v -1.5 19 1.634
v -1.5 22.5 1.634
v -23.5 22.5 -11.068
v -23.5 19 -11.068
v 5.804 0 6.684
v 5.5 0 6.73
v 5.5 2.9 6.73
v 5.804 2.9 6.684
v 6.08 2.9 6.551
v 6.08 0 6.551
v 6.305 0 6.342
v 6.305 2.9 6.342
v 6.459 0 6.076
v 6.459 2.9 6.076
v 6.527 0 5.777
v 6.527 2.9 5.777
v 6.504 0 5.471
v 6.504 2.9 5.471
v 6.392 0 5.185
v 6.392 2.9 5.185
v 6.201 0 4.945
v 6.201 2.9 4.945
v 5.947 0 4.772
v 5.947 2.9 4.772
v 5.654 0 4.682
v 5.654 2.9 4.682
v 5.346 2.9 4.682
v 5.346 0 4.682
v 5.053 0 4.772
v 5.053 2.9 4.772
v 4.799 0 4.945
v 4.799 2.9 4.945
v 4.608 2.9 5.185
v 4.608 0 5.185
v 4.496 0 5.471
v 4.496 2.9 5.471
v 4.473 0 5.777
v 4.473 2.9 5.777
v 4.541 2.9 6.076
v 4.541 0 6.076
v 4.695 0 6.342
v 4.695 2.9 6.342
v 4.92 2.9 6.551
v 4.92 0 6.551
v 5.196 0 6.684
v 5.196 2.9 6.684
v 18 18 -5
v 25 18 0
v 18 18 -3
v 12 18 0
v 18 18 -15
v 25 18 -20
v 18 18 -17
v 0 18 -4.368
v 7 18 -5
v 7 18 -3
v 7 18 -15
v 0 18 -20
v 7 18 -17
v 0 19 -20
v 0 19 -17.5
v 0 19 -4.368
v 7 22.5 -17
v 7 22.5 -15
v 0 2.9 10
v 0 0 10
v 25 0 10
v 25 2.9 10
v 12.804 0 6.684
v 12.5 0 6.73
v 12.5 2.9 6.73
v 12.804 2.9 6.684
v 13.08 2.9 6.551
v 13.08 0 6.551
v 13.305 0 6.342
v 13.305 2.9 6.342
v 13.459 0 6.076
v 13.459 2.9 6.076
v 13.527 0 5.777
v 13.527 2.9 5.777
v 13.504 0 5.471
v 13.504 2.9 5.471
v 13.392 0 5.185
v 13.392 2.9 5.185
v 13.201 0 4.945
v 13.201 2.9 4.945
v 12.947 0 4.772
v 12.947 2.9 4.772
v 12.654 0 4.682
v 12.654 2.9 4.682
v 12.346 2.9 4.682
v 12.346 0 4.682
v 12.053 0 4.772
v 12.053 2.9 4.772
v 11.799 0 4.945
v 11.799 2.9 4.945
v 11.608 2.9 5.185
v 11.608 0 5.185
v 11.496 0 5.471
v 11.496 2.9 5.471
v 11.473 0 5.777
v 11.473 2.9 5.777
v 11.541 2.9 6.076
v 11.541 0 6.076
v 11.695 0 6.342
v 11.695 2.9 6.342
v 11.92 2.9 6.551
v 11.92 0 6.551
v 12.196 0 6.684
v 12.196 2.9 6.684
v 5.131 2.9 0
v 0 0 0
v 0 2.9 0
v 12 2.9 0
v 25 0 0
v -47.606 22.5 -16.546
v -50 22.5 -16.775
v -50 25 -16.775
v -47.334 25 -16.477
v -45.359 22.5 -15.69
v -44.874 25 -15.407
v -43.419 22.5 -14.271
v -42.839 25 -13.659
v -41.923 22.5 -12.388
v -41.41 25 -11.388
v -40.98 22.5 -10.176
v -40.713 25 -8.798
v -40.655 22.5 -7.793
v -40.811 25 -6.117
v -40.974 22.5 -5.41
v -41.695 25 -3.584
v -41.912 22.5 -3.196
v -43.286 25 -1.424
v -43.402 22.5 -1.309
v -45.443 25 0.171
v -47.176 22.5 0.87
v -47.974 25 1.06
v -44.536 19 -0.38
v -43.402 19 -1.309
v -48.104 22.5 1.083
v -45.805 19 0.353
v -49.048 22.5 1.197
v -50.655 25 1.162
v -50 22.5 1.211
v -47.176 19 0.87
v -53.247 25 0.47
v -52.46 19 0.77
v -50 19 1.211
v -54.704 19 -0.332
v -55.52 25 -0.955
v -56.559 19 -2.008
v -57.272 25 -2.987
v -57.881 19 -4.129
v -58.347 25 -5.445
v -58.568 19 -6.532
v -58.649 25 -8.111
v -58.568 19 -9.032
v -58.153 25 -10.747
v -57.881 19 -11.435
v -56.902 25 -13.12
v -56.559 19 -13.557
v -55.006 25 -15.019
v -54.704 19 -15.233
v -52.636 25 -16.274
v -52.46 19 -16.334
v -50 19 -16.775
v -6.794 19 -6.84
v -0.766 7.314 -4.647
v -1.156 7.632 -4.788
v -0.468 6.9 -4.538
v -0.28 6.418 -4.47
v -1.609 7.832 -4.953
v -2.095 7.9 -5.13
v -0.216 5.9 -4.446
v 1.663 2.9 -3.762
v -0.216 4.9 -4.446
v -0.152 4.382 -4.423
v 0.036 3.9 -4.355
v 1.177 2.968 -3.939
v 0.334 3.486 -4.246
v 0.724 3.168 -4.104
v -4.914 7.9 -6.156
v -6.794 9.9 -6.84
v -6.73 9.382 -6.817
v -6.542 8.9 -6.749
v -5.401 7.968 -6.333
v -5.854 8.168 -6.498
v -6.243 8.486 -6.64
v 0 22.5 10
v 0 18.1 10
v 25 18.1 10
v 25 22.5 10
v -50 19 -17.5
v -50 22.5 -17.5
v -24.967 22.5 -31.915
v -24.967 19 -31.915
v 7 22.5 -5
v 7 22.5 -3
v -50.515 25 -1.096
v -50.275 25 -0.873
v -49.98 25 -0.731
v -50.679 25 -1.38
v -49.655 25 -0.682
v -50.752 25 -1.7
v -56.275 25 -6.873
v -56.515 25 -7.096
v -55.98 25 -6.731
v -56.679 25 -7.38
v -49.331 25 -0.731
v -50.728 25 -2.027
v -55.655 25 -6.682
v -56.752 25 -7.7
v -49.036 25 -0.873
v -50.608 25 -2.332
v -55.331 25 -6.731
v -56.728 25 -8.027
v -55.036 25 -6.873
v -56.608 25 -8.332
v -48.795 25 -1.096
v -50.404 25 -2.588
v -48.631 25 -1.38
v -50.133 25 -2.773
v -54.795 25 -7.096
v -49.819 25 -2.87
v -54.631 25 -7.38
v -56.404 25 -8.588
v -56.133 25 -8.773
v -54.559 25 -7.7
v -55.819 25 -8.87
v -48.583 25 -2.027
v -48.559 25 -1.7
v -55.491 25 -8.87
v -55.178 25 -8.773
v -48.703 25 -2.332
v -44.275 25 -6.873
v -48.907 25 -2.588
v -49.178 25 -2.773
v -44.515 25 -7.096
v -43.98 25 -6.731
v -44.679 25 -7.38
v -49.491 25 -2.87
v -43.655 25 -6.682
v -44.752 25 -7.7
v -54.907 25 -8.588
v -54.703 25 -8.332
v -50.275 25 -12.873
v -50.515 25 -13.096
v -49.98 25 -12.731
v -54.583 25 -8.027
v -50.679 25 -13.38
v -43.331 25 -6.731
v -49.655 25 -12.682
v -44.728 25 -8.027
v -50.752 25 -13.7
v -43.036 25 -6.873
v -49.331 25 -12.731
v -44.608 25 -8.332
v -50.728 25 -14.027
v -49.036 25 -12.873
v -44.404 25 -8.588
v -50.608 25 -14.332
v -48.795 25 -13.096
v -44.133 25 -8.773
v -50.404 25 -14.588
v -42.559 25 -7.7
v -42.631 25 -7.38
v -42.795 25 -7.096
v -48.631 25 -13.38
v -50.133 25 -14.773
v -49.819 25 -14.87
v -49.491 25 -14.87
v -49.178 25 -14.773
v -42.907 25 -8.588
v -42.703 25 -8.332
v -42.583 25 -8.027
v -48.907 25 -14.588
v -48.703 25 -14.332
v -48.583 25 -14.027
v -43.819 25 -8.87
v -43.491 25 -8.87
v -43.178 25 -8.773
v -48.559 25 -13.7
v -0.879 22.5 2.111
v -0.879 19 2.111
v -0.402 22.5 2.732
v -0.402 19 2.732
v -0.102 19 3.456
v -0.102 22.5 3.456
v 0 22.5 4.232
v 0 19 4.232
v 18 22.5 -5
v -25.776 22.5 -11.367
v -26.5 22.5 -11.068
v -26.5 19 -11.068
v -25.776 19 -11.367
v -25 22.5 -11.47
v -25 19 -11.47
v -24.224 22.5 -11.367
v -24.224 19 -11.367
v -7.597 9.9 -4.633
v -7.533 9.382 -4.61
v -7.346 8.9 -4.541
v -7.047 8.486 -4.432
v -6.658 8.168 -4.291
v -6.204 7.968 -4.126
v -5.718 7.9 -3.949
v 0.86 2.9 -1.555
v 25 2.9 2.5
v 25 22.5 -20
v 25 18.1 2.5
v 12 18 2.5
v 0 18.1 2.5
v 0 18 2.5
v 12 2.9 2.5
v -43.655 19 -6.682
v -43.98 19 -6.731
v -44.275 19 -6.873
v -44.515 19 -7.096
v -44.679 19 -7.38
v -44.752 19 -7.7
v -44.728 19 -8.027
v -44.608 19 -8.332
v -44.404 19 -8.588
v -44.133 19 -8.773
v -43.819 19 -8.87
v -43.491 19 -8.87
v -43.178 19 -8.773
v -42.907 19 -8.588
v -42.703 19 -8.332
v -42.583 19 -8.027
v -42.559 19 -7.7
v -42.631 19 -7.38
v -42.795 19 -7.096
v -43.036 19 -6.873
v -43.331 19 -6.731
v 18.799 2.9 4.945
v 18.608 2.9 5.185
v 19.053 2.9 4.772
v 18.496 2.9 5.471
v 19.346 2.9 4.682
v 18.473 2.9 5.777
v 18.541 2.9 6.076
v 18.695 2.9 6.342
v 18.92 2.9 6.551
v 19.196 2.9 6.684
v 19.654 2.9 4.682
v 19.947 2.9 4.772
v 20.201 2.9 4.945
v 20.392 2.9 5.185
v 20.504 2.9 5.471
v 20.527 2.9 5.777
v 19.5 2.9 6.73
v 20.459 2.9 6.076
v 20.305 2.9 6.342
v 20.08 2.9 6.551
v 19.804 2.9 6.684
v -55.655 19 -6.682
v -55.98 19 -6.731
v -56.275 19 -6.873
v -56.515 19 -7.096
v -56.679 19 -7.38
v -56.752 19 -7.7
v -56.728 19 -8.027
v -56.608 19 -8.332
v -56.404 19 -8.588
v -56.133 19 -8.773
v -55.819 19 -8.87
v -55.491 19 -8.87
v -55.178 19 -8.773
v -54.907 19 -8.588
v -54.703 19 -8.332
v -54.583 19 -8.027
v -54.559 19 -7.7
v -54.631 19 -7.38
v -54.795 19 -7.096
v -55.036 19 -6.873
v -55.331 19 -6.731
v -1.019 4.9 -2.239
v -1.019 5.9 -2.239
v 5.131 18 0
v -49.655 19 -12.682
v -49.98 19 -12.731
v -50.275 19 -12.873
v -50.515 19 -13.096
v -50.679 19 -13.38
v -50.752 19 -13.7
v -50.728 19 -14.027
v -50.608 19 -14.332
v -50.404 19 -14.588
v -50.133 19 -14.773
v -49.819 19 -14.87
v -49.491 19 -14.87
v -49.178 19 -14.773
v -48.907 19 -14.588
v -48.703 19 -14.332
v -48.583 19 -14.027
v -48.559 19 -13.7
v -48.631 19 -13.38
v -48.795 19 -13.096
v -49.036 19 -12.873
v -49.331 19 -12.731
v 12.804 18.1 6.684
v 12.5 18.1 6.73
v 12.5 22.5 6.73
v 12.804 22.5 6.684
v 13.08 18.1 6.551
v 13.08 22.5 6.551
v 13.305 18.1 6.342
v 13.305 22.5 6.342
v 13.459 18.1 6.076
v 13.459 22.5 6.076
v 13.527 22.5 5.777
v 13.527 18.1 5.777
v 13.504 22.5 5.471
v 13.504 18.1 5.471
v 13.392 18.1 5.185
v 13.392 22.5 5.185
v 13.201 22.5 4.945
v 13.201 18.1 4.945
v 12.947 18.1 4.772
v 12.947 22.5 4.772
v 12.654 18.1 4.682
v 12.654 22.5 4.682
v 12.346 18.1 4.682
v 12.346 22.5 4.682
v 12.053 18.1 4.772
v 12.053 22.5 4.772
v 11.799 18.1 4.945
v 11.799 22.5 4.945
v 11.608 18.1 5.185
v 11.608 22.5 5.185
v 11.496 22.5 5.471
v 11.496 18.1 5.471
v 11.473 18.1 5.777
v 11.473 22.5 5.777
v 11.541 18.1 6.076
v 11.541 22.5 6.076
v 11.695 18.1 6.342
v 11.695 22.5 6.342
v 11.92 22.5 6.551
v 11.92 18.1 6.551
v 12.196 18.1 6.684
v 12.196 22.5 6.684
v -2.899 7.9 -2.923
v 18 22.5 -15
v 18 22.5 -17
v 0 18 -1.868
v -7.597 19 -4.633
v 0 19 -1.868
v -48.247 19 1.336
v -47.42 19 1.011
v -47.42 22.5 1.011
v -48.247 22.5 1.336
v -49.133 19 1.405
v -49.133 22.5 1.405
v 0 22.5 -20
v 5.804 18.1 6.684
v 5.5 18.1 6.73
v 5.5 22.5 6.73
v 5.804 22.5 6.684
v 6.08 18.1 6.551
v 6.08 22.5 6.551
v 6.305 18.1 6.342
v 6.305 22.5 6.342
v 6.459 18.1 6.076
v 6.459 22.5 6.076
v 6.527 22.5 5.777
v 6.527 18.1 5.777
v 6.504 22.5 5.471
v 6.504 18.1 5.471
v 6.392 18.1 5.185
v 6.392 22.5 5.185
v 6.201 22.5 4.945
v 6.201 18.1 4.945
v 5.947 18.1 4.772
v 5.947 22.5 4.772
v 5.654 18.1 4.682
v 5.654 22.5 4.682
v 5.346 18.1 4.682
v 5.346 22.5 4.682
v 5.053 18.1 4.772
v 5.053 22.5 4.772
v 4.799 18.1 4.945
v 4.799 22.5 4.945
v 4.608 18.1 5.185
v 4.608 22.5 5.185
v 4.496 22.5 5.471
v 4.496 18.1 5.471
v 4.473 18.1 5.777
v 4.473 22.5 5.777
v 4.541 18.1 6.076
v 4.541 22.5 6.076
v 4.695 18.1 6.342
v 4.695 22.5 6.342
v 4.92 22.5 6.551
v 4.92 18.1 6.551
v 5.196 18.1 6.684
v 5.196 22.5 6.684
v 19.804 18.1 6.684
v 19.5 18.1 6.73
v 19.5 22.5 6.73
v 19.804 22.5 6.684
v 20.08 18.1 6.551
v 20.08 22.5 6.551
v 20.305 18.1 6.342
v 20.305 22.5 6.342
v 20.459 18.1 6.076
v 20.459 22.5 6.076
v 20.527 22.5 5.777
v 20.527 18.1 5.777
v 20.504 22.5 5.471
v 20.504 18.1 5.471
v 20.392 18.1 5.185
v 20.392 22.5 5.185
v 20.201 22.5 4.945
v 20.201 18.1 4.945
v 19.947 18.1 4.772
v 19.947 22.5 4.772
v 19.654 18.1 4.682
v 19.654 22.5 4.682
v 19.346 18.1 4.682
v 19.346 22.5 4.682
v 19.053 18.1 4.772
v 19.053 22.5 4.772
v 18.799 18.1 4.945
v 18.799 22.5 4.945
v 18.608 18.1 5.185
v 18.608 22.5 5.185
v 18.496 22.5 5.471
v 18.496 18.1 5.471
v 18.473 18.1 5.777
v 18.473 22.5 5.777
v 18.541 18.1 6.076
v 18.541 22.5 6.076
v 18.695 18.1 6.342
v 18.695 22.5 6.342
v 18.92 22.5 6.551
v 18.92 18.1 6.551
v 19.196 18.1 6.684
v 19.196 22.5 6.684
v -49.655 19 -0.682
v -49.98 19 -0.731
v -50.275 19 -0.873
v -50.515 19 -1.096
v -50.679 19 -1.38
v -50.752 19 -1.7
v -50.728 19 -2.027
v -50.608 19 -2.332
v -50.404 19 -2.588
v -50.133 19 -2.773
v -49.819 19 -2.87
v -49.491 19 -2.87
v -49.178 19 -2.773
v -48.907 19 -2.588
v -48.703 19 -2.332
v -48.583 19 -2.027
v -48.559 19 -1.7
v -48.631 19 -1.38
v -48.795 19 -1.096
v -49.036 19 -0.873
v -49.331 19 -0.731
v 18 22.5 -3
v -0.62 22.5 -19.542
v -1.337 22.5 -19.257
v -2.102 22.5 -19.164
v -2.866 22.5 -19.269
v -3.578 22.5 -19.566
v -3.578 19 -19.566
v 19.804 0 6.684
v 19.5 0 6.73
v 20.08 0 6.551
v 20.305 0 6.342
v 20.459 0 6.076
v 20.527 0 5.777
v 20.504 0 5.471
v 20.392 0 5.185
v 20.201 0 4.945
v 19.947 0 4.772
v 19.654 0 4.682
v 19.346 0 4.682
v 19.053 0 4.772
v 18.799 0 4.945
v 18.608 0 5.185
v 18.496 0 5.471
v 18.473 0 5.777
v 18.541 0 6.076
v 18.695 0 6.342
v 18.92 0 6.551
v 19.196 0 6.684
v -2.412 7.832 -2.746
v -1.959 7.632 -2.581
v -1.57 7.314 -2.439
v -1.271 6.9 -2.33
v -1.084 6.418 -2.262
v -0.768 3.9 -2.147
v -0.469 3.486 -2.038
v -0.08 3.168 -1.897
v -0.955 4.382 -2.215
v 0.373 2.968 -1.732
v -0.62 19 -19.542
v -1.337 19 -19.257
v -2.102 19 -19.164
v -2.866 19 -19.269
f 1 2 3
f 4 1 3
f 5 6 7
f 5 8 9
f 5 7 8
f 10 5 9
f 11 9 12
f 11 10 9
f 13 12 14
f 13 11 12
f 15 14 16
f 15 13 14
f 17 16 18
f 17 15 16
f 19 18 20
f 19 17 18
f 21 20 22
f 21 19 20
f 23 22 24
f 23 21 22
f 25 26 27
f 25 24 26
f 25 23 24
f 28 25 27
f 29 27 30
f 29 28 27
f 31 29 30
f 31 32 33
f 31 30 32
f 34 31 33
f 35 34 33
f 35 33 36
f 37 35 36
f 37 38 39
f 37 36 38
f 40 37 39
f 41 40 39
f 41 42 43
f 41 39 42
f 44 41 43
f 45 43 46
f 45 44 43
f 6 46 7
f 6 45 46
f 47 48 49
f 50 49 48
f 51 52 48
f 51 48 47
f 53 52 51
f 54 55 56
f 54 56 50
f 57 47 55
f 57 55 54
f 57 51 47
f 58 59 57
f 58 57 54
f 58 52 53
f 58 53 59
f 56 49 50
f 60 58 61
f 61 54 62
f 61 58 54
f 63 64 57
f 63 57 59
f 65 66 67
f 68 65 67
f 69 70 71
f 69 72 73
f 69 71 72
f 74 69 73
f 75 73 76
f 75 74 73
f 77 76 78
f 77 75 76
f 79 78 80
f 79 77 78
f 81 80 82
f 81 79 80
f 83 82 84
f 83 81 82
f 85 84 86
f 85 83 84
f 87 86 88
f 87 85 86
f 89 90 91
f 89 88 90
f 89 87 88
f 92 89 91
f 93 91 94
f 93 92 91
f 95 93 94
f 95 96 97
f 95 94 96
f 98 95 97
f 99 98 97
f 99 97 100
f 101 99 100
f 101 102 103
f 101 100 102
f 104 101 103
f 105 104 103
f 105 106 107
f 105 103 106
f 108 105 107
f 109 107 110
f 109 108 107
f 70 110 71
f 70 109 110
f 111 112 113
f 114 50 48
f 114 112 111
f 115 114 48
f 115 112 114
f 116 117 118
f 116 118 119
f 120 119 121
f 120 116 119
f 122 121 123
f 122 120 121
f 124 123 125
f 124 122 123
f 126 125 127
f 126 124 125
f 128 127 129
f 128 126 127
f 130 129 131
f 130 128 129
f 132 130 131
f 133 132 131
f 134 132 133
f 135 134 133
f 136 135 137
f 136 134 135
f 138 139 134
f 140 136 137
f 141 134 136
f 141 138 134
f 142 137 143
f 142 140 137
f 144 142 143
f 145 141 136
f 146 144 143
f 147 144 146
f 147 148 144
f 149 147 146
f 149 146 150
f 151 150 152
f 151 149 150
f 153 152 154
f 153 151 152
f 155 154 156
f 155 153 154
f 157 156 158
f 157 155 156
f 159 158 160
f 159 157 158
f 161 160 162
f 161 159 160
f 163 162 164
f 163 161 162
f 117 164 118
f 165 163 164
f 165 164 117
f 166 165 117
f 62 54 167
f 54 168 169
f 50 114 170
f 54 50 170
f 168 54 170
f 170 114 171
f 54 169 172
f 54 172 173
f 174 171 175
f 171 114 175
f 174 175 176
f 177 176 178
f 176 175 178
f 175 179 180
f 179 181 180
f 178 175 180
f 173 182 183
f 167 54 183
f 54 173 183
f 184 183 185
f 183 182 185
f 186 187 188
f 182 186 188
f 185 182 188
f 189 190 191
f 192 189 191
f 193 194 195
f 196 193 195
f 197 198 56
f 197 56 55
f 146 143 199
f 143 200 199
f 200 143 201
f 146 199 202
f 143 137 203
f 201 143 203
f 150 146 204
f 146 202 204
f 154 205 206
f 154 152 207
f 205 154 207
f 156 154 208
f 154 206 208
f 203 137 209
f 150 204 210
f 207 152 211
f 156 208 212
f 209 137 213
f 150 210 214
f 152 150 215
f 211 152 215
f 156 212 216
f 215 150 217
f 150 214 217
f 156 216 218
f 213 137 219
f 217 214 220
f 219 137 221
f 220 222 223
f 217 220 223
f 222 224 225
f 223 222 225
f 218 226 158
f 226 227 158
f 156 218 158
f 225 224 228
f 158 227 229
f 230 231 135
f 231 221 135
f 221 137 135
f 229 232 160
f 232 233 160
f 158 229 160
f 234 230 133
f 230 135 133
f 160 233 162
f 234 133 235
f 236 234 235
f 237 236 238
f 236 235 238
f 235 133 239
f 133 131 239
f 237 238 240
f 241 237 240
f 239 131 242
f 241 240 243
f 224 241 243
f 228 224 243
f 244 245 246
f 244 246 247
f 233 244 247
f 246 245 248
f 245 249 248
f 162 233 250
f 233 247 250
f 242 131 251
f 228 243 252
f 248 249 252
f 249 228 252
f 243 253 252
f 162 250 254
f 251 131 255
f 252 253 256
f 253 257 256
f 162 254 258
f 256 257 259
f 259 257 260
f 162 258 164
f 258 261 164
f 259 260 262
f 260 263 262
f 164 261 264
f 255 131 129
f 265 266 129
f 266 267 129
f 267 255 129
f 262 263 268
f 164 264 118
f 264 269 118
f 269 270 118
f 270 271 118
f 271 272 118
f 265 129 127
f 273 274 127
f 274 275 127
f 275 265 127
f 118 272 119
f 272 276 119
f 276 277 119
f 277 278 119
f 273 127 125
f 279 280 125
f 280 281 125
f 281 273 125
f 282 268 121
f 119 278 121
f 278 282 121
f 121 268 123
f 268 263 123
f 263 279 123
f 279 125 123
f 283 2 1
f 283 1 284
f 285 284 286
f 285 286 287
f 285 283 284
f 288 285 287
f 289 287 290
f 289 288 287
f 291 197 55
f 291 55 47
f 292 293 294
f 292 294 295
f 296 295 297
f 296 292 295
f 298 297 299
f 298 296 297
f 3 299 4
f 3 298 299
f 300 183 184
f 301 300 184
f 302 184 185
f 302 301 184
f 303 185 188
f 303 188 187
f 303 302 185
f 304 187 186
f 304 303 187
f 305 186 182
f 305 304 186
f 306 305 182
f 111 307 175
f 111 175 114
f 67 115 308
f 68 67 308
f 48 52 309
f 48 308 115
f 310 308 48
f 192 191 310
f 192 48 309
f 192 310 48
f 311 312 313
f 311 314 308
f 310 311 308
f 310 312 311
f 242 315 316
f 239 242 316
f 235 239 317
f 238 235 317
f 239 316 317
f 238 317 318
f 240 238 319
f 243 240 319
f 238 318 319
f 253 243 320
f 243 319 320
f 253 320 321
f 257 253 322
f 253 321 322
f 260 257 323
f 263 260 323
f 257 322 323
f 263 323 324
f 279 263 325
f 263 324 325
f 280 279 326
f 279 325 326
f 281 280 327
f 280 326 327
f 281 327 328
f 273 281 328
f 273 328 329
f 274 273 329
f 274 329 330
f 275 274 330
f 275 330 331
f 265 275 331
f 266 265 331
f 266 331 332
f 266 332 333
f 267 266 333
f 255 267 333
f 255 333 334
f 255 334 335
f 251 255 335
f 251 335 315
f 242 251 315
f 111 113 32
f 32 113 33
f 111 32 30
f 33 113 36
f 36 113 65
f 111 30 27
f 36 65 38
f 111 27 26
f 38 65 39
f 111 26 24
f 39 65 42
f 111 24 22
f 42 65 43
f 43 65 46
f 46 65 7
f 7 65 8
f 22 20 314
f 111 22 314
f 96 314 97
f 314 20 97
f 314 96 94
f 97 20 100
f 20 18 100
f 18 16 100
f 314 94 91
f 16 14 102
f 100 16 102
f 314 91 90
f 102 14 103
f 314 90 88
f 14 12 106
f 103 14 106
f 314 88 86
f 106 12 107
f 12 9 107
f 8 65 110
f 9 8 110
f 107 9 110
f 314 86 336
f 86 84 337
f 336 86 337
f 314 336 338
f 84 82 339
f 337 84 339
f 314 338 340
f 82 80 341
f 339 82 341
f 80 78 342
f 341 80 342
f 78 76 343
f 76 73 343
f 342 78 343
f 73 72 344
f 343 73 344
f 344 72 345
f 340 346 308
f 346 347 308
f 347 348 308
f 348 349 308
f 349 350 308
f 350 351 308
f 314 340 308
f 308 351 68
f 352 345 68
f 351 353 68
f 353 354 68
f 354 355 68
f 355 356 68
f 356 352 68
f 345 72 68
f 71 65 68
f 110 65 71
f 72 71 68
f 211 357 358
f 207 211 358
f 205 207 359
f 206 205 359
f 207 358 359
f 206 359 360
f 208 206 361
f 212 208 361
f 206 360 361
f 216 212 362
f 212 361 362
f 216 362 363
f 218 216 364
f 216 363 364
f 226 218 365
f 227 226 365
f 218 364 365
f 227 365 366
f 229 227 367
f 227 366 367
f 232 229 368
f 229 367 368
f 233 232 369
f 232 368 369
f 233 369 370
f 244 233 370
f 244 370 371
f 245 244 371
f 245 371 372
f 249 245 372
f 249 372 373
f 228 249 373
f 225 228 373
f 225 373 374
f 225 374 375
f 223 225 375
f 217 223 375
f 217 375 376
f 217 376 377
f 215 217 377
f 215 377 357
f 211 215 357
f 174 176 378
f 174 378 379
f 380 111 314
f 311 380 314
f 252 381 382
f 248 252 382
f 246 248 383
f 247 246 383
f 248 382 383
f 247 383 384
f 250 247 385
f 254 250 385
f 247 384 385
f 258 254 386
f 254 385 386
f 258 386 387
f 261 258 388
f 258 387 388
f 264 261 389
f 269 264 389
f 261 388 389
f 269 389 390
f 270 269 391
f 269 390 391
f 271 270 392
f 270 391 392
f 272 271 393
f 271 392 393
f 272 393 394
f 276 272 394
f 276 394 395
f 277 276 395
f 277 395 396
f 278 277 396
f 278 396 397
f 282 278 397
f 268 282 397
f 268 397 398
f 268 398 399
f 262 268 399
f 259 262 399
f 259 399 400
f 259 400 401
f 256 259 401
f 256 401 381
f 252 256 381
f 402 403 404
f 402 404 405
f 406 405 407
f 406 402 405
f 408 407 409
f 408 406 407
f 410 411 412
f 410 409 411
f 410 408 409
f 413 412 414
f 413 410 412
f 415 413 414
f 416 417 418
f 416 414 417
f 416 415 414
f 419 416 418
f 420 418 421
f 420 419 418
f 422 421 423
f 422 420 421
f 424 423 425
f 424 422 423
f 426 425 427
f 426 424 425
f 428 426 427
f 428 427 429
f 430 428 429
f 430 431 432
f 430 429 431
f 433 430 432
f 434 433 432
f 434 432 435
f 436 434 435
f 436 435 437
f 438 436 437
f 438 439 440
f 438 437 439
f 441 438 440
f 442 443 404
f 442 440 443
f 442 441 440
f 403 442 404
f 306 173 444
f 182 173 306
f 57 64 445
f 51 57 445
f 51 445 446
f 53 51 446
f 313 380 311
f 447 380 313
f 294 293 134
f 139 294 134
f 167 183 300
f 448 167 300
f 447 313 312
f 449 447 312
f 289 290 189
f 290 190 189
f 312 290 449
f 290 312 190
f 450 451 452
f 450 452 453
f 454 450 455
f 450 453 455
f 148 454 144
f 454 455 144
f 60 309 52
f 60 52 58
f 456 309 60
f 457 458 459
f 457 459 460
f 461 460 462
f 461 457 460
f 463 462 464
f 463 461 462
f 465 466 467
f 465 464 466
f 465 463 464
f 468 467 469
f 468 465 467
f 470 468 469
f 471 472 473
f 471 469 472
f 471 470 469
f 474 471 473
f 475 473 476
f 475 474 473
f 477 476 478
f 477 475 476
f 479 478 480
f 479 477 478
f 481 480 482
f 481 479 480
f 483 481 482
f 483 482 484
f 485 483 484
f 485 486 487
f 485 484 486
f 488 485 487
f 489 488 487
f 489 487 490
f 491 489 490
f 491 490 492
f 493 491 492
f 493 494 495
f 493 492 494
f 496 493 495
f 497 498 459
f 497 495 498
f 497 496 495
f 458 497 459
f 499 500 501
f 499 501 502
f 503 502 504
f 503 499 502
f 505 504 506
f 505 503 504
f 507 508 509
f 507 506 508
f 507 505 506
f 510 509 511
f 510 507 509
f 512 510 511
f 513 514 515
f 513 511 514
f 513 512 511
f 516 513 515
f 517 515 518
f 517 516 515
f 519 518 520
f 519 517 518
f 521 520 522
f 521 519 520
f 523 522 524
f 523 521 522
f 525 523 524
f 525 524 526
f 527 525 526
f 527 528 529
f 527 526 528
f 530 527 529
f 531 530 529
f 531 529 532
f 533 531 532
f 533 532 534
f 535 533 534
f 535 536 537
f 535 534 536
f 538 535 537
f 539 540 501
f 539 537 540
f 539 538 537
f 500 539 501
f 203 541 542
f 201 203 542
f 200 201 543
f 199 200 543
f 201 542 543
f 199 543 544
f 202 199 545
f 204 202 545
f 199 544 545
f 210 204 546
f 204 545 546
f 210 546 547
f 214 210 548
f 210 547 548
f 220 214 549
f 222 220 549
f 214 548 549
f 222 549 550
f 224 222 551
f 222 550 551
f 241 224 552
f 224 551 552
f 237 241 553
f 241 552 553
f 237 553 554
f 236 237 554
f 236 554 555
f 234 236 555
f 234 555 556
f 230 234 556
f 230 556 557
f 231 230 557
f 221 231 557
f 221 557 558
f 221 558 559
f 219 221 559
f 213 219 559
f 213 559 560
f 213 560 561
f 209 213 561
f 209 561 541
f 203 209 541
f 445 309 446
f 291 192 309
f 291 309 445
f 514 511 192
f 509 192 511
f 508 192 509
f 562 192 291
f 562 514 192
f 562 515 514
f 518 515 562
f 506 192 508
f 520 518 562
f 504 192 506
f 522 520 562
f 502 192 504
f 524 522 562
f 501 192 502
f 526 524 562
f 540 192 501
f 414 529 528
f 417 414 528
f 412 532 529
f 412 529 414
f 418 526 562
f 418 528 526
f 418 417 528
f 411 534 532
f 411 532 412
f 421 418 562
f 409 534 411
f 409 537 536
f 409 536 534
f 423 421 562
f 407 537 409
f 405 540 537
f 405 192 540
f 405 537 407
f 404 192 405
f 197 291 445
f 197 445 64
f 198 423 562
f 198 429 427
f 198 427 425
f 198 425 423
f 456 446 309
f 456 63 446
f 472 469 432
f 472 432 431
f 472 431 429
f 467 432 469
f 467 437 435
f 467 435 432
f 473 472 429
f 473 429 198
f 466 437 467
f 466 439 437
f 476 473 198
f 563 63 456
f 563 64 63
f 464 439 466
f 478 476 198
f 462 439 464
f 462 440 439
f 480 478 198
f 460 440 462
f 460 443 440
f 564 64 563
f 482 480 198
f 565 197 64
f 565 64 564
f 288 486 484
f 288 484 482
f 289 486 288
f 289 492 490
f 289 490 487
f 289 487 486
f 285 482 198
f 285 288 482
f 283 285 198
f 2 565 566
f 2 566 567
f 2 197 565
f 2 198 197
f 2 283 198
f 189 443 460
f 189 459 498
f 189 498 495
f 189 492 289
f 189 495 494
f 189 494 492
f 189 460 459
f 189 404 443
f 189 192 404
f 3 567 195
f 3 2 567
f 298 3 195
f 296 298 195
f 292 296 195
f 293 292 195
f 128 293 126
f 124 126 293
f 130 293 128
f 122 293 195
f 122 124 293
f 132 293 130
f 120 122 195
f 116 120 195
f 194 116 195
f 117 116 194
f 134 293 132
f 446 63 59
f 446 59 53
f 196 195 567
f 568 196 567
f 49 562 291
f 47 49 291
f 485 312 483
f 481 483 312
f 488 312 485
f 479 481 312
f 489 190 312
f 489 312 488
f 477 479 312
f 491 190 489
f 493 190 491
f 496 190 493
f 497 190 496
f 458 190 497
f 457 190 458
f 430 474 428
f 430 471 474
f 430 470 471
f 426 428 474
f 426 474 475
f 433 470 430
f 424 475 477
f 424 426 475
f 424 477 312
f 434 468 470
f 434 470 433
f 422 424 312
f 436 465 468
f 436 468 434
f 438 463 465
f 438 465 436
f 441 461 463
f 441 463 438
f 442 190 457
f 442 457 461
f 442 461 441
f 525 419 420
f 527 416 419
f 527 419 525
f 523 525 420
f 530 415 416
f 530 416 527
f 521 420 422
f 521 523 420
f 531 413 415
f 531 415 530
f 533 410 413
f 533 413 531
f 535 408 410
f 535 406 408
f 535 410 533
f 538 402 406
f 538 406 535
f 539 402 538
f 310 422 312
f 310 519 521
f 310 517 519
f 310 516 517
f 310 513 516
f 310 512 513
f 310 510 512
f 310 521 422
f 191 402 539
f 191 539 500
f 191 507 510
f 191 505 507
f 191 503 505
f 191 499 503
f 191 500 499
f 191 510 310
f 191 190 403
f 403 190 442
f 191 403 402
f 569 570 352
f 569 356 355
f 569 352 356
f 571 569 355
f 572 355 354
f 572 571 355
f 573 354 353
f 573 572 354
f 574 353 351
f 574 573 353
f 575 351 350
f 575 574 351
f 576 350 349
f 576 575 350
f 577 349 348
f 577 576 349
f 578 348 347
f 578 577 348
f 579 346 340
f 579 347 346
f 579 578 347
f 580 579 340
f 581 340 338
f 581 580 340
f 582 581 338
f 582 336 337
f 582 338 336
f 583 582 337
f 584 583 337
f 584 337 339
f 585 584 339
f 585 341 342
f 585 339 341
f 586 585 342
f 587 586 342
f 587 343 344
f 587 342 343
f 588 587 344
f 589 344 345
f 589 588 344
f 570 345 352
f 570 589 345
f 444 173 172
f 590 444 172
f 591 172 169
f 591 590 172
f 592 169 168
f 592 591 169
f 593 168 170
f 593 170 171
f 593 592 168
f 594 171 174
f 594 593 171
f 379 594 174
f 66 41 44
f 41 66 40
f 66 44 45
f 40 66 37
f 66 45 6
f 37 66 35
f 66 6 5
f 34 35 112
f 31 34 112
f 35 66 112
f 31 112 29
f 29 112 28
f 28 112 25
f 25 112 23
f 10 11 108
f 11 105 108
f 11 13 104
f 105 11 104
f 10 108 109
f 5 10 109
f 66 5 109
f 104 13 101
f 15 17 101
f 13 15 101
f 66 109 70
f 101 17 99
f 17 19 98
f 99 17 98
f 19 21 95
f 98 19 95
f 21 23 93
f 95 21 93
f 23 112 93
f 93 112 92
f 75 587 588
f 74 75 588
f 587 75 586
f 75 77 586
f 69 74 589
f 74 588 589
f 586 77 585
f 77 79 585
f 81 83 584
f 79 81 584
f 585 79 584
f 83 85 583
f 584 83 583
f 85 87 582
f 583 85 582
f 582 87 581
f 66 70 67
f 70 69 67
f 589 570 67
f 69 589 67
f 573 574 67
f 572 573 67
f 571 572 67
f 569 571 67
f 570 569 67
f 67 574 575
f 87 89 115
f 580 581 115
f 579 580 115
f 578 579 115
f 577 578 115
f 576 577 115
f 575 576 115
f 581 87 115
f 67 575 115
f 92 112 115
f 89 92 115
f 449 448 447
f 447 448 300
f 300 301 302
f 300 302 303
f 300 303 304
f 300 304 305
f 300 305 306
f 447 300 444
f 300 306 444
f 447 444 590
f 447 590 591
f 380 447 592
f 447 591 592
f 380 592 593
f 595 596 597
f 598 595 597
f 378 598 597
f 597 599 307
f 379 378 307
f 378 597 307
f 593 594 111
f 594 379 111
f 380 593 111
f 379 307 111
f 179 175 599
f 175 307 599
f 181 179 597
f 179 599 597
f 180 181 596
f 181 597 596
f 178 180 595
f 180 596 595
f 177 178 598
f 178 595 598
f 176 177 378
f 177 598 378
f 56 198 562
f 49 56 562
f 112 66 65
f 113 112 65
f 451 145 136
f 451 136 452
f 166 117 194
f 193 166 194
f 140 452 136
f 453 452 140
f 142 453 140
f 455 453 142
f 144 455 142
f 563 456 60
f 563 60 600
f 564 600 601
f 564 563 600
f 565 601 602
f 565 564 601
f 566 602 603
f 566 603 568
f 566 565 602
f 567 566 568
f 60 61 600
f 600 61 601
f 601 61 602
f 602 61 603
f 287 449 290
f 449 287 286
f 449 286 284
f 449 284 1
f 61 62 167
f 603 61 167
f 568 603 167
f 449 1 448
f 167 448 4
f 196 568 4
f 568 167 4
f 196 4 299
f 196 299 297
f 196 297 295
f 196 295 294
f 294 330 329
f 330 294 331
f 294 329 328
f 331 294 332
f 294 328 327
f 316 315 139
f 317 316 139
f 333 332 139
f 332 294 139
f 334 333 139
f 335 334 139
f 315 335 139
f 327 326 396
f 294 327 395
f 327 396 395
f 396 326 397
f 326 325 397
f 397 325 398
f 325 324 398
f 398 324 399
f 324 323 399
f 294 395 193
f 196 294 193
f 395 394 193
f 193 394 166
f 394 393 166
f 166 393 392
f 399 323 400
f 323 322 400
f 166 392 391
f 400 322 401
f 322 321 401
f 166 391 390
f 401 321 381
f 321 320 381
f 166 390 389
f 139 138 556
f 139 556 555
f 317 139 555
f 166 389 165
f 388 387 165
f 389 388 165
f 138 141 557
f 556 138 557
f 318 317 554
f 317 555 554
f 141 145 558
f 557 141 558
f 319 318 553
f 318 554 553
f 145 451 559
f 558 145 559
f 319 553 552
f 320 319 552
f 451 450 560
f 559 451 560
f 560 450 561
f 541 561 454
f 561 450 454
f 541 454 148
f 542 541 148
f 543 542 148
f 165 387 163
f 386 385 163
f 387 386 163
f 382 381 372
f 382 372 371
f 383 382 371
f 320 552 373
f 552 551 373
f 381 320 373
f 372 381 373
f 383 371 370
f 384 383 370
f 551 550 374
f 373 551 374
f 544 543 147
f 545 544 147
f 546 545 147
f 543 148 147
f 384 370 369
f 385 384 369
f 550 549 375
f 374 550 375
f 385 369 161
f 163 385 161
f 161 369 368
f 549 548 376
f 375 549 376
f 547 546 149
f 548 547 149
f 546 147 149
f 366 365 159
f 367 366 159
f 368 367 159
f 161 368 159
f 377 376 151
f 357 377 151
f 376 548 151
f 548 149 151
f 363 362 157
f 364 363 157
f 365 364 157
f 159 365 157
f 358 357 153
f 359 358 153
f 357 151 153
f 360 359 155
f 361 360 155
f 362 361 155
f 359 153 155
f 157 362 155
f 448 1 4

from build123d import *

# Parameters (mm, degrees)
SKETCH_1_W               = 25
SKETCH_1_H               = 10
EXTRUDE_1_DEPTH          = 22.5
SKETCH_2_W               = 25
SKETCH_2_H               = 15.2
CUT_EXTRUDE_1_DEPTH      = 7.5
CUT_EXTRUDE_2_DEPTH      = 36.089172119
CUT_EXTRUDE_2_DEPTH_BACK = 36.089172119
SKETCH_4_R               = 1.03
SKETCH_5_W               = 25
SKETCH_5_H               = 4.5
EXTRUDE_2_DEPTH          = 20
SKETCH_6_W               = 11
SKETCH_6_H               = 2
CUT_EXTRUDE_3_DEPTH      = 4.5
EXTRUDE_3_DEPTH          = 3.5
SKETCH_16_R              = 9
EXTRUDE_4_DEPTH          = 6
CUT_EXTRUDE_4_REACH      = 71.426
SKETCH_17_R              = 1.1
CUT_EXTRUDE_5_REACH      = 73.302
SKETCH_19_W              = 12
SKETCH_19_H              = 15.1
FILLET_7_R               = 3
EXTRUDE_6_REACH          = 72.338
CUT_EXTRUDE_6_REACH      = 72.847
SKETCH_22_W              = 7
SKETCH_22_H              = 5
FILLET_8_R               = 2


with BuildPart() as part:
    # 草图1 → 凸台-拉伸1 (new body)
    with BuildSketch(Plane(origin=(0, 0, 0), x_dir=(1, 0, 0), z_dir=(0, 1, 0))):
        with Locations((12.5, -5)):
            Rectangle(SKETCH_1_W, SKETCH_1_H)
    extrude(amount=EXTRUDE_1_DEPTH)

    # 草图2 → 切除-拉伸1 (cut)
    with BuildSketch(Plane.XY.offset(10)):
        with Locations((12.5, 10.5)):
            Rectangle(SKETCH_2_W, SKETCH_2_H)
    extrude(amount=-CUT_EXTRUDE_1_DEPTH, mode=Mode.SUBTRACT)

    # 草图4 → 切除-拉伸2 (cut, two sides: drawn at the far end of the back side and taken through both)
    with BuildSketch(Plane(origin=(0, 22.5, 0), x_dir=(1, 0, 0), z_dir=(0, 1, 0)).offset(-CUT_EXTRUDE_2_DEPTH_BACK)):
        with Locations(Location((12.5, -5.7, 0), (0, 0, 270))):
            Circle(SKETCH_4_R)
        with Locations(Location((19.5, -5.7, 0), (0, 0, 270))):
            Circle(SKETCH_4_R)
        with Locations(Location((5.5, -5.7, 0), (0, 0, 270))):
            Circle(SKETCH_4_R)
    extrude(amount=CUT_EXTRUDE_2_DEPTH + CUT_EXTRUDE_2_DEPTH_BACK, mode=Mode.SUBTRACT)

    # 草图5 → 凸台-拉伸2 (add)
    with BuildSketch(Plane(origin=(0, 0, 0), x_dir=(-1, 0, 0), z_dir=(0, 0, -1))):
        with Locations((-12.5, 20.25)):
            Rectangle(SKETCH_5_W, SKETCH_5_H)
    extrude(amount=EXTRUDE_2_DEPTH)

    # 草图6 → 切除-拉伸3 (cut)
    with BuildSketch(Plane(origin=(0, 22.5, 0), x_dir=(1, 0, 0), z_dir=(0, 1, 0))):
        with Locations((12.5, 16)):
            Rectangle(SKETCH_6_W, SKETCH_6_H)
        with Locations((12.5, 4)):
            Rectangle(SKETCH_6_W, SKETCH_6_H)
    extrude(amount=-CUT_EXTRUDE_3_DEPTH, mode=Mode.SUBTRACT)

    # 草图15 → 凸台-拉伸3 (add)
    with BuildSketch(Plane(origin=(0, 22.5, 0), x_dir=(1, 0, 0), z_dir=(0, 1, 0))):
        Polygon((0, 17.5), (0, -2.5), (-25, 11.93375673), (-50, -2.5), (-50, 17.5), (-24.967235844, 31.914840335), align=None)
    extrude(amount=-EXTRUDE_3_DEPTH)

    # 草图16 → 凸台-拉伸4 (add)
    with BuildSketch(Plane.XZ.offset(-19)):
        with Locations(Location((-49.655444566, -7.782050808, 0), (0, 0, 267.805955804))):
            Circle(SKETCH_16_R)
    extrude(amount=-EXTRUDE_4_DEPTH)

    # 草图17 → 切除-拉伸4 (cut, up to next)
    with BuildSketch(Plane.XZ.offset(-19), mode=Mode.PRIVATE) as cut_extrude_4_sk1:
        with Locations(Location((-55.655444566, -7.782050808, 0), (0, 0, 90))):
            Circle(SKETCH_17_R)
    cut_extrude_4_tool1 = extrude(cut_extrude_4_sk1.sketch, amount=-CUT_EXTRUDE_4_REACH, mode=Mode.PRIVATE) & part.part
    # 草图17 → 切除-拉伸4 (cut, up to next)
    with BuildSketch(Plane.XZ.offset(-19), mode=Mode.PRIVATE) as cut_extrude_4_sk2:
        with Locations(Location((-43.655444566, -7.782050808, 0), (0, 0, 90))):
            Circle(SKETCH_17_R)
    cut_extrude_4_tool2 = extrude(cut_extrude_4_sk2.sketch, amount=-CUT_EXTRUDE_4_REACH, mode=Mode.PRIVATE) & part.part
    # 草图17 → 切除-拉伸4 (cut, up to next)
    with BuildSketch(Plane.XZ.offset(-19), mode=Mode.PRIVATE) as cut_extrude_4_sk3:
        with Locations(Location((-49.655444566, -1.782050808, 0), (0, 0, 90))):
            Circle(SKETCH_17_R)
    cut_extrude_4_tool3 = extrude(cut_extrude_4_sk3.sketch, amount=-CUT_EXTRUDE_4_REACH, mode=Mode.PRIVATE) & part.part
    # 草图17 → 切除-拉伸4 (cut, up to next)
    with BuildSketch(Plane.XZ.offset(-19), mode=Mode.PRIVATE) as cut_extrude_4_sk4:
        with Locations(Location((-49.655444566, -13.782050808, 0), (0, 0, 90))):
            Circle(SKETCH_17_R)
    cut_extrude_4_tool4 = extrude(cut_extrude_4_sk4.sketch, amount=-CUT_EXTRUDE_4_REACH, mode=Mode.PRIVATE) & part.part
    add(cut_extrude_4_tool1.solids().sort_by_distance((-55.655445, 19, -7.782051))[0], mode=Mode.SUBTRACT)
    add(cut_extrude_4_tool2.solids().sort_by_distance((-43.655445, 19, -7.782051))[0], mode=Mode.SUBTRACT)
    add(cut_extrude_4_tool3.solids().sort_by_distance((-49.655445, 19, -1.782051))[0], mode=Mode.SUBTRACT)
    add(cut_extrude_4_tool4.solids().sort_by_distance((-49.655445, 19, -13.782051))[0], mode=Mode.SUBTRACT)

    # 草图19 → 切除-拉伸5 (cut, up to next)
    with BuildSketch(Plane(origin=(0, 0, 0), x_dir=(-1, 0, 0), z_dir=(0, 0, -1)), mode=Mode.PRIVATE) as cut_extrude_5_sk1:
        with Locations((-6, 10.45)):
            Rectangle(SKETCH_19_W, SKETCH_19_H)
    cut_extrude_5_tool1 = extrude(cut_extrude_5_sk1.sketch, amount=-CUT_EXTRUDE_5_REACH, mode=Mode.PRIVATE) & part.part
    add(cut_extrude_5_tool1.solids().sort_by_distance((6, 10.45, 0))[0], mode=Mode.SUBTRACT)

    # 圆角7
    # the kernel refuses this fillet: 3 mm, written as the material it adds along each edge
    with BuildSketch(Plane(origin=(0, 22.5, -17.5), x_dir=(-0.866025403784437, 0, -0.5000000000000027), z_dir=(0, -1, 0))) as fillet_7_piece_1:
        with BuildLine():
            CenterArc((4.131472029, 3), FILLET_7_R, 196.159495152, 73.840504848)
            Line((1.25, 2.165063509), (0, 0))
            Line((0, 0), (4.131472029, 0))
        make_face()
    extrude(amount=3.5)
    with BuildSketch(Plane(origin=(0, 22.5, 2.5), x_dir=(-0.8660254037844379, 0, -0.5000000000000012), z_dir=(0, -1, 0))) as fillet_7_piece_2:
        with BuildLine():
            CenterArc((FILLET_7_R * 0.57735026919, -FILLET_7_R), FILLET_7_R, 90, 60)
            Line((-FILLET_7_R * 0.288675134595, -FILLET_7_R * 0.5), (0, 0))
            Line((0, 0), (FILLET_7_R * 0.57735026919, 0))
        make_face()
    extrude(amount=3.5)
    with BuildSketch(Plane(origin=(-25, 22.5, -11.93375673), x_dir=(0.8660254037844384, 0, 0.5000000000000003), z_dir=(0, -1, 0))) as fillet_7_piece_3:
        with BuildLine():
            CenterArc((FILLET_7_R * 0.57735026919, FILLET_7_R), FILLET_7_R, 210, 60)
            Line((-FILLET_7_R * 0.288675134595, FILLET_7_R * 0.5), (0, 0))
            Line((0, 0), (FILLET_7_R * 0.57735026919, 0))
        make_face()
    extrude(amount=3.5)
    # the kernel refuses this fillet: 3 mm, written as the material it takes off along each edge
    with BuildSketch(Plane(origin=(-50, 29.947415965, 2.5), x_dir=(0, 0, -1), z_dir=(0, -1, 0))) as fillet_7_2_piece_1:
        with BuildLine():
            CenterArc((4.087559404, 1.079860567), FILLET_7_R, 150, 51.097341704)
            Line((1.489483193, 2.579860567), (0, 0))
            Line((0, 0), (1.288648696, 0))
        make_face()
    extrude(amount=18.394831929, mode=Mode.SUBTRACT)

    # 凸台-拉伸6: up to this face of the body (flat: up to its plane)
    extrude_6_end = Plane(part.part.faces().sort_by_distance((-27.69980279, 19, -14.058564272))[0])
    # 草图21 → 凸台-拉伸6 (add, up to the picked face)
    with BuildSketch(Plane(origin=(0, 2.9, 0), x_dir=(1, 0, 0), z_dir=(0, 1, 0)), mode=Mode.PRIVATE) as extrude_6_sk1:
        Polygon((5.131306451, 0), (12, 0), (-6.793852416, 6.840402867), (-7.597336928, 4.632847313), align=None)
    extrude_6_tool1 = split(extrude(extrude_6_sk1.sketch, amount=EXTRUDE_6_REACH, mode=Mode.PRIVATE), bisect_by=extrude_6_end, keep=Keep.BOTH, mode=Mode.PRIVATE)
    # 草图21 → 凸台-拉伸6 (add, up to the picked face)
    with BuildSketch(Plane(origin=(0, 2.9, 0), x_dir=(1, 0, 0), z_dir=(0, 1, 0)), mode=Mode.PRIVATE) as extrude_6_sk2:
        Polygon((5.131306451, 0), (12, -2.5), (12, 0), align=None)
    extrude_6_tool2 = split(extrude(extrude_6_sk2.sketch, amount=EXTRUDE_6_REACH, mode=Mode.PRIVATE), bisect_by=extrude_6_end, keep=Keep.BOTH, mode=Mode.PRIVATE)
    add(extrude_6_tool1.solids().sort_by(Axis((0.808046, 2.9, -2.903709), (0, 1, 0)))[0])
    add(extrude_6_tool2.solids().sort_by(Axis((9.710435, 2.9, 0.833333), (0, 1, 0)))[0])

    # 草图22 → 切除-拉伸6 (cut, up to next)
    with BuildSketch(Plane(origin=(1.403733341, 0, -3.856725658), x_dir=(-0.9396926207859082, 0, -0.3420201433256691), z_dir=(0.3420201433256691, 0, -0.9396926207859082)), mode=Mode.PRIVATE) as cut_extrude_6_sk1:
        with Locations((5.223688551, 5.4)):
            Rectangle(SKETCH_22_W, SKETCH_22_H)
    cut_extrude_6_tool1 = extrude(cut_extrude_6_sk1.sketch, amount=-CUT_EXTRUDE_6_REACH, mode=Mode.PRIVATE) & part.part
    add(cut_extrude_6_tool1.solids().sort_by_distance((-3.504928, 5.4, -5.643332))[0], mode=Mode.SUBTRACT)

    # 圆角8
    fillet_8_edges = [part.edges().sort_by_distance(p)[0] for p in [
        (-7.195594672, 7.9, -5.73662509),
        (-0.617746326, 2.9, -3.342484086),
        (-0.617746326, 7.9, -3.342484086),
    ]]
    fillet(fillet_8_edges, radius=FILLET_8_R)


solid = part.part
